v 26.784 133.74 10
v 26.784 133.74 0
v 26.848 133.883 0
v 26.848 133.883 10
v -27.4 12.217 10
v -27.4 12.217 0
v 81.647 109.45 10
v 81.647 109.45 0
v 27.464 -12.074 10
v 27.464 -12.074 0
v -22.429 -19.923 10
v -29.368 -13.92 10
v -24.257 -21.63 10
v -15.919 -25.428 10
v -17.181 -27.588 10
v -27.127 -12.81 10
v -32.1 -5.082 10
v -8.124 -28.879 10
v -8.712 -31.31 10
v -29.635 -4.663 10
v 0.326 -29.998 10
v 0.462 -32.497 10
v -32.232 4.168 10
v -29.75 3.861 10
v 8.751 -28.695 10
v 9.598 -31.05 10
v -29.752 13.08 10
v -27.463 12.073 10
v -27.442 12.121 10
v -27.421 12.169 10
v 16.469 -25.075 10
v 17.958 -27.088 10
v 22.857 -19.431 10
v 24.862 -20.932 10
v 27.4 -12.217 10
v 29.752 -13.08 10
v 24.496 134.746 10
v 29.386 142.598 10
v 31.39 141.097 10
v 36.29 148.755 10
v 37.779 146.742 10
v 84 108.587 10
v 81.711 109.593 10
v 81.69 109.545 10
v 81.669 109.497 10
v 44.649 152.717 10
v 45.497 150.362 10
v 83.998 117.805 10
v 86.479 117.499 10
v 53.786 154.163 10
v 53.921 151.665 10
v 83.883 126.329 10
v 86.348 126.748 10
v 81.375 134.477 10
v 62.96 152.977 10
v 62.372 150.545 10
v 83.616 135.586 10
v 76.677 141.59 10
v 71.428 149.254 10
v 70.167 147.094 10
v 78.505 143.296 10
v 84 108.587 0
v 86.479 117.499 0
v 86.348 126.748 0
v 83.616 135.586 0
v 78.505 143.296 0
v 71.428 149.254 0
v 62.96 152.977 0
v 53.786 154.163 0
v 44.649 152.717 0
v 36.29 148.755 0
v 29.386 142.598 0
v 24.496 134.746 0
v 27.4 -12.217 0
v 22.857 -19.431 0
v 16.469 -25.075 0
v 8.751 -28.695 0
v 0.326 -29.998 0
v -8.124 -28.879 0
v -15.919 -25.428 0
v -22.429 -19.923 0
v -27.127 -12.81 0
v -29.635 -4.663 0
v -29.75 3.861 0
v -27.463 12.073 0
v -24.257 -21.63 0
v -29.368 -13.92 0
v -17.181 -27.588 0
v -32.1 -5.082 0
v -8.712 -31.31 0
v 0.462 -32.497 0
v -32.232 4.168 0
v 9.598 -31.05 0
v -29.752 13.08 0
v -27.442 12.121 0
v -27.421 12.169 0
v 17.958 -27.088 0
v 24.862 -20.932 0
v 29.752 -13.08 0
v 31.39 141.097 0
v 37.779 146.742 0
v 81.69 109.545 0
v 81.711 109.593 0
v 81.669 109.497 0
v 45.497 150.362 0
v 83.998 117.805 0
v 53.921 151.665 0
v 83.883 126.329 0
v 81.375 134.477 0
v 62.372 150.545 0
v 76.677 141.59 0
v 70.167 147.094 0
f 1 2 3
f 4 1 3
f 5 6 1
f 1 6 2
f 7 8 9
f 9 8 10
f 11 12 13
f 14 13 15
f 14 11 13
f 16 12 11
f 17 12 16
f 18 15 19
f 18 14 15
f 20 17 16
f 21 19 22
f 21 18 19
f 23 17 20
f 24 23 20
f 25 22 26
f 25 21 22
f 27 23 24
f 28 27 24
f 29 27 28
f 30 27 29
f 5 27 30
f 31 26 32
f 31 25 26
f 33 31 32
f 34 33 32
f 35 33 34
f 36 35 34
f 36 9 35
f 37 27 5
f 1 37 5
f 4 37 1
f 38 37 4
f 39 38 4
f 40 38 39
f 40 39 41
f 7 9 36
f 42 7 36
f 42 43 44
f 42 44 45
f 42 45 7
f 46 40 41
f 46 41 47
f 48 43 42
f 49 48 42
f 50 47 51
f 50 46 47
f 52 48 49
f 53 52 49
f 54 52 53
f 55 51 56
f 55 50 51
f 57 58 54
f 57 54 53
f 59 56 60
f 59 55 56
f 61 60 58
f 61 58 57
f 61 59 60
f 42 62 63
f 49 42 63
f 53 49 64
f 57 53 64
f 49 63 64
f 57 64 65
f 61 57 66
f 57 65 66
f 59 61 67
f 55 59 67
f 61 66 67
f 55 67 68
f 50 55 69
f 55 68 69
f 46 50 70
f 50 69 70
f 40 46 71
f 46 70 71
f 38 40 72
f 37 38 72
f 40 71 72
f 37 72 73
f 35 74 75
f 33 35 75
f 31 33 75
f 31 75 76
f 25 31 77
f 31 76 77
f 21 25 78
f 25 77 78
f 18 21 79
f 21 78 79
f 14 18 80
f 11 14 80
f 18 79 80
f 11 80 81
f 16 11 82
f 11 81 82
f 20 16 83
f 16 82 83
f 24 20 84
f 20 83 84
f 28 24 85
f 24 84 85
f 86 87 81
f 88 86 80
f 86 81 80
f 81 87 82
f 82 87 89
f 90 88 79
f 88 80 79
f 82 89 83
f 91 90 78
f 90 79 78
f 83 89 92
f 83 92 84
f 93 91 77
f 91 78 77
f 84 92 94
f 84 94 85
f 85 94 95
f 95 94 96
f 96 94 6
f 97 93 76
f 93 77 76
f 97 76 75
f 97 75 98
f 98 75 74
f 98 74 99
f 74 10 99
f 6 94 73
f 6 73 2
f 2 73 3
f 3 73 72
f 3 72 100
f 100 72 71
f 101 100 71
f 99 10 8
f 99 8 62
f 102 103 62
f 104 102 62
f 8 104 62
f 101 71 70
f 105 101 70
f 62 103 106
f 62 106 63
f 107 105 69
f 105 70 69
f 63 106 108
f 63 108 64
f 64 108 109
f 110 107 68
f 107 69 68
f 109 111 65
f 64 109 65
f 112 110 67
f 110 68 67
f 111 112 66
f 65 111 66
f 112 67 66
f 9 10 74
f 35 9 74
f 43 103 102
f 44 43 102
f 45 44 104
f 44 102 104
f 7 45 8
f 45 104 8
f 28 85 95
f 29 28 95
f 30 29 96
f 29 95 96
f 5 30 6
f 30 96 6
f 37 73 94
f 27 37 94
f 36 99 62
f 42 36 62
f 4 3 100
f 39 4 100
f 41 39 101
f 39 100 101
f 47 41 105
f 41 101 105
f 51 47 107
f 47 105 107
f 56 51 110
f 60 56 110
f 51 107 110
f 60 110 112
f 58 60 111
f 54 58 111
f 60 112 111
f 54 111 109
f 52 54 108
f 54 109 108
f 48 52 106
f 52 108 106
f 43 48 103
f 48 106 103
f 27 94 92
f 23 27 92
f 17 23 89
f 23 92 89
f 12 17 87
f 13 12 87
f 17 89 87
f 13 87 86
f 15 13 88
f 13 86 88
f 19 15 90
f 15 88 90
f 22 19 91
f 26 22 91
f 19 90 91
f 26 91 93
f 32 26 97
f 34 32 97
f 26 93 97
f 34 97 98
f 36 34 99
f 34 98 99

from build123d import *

# Parameters (mm, degrees)
EXTRUDE_1_DEPTH = 10


with BuildPart() as part:
    # 草图1 → 凸台-拉伸1 (new body)
    with BuildSketch(Plane.XY):
        with BuildLine():
            Line((26.783972095, 133.739971334), (26.847812167, 133.883151585))
            ThreePointArc((26.847812167, 133.883151585), (66.392800103, 149.097978029), (81.71089656, 109.59287791))
            Line((81.71089656, 109.59287791), (83.99950279, 108.586755885))
            ThreePointArc((83.99950279, 108.586755885), (67.327208125, 151.41822318), (24.49574083, 134.745928515))
            Line((24.49574083, 134.745928515), (26.783972095, 133.739971334))
        make_face()
        with BuildLine():
            ThreePointArc((-27.46327475, 12.073464291), (-27.431635829, 12.145178293), (-27.399809643, 12.216809384))
            Line((-27.399809643, 12.216809384), (26.783972095, 133.739971334))
            Line((26.783972095, 133.739971334), (24.49574083, 134.745928515))
            Line((24.49574083, 134.745928515), (-29.75188098, 13.079586315))
            Line((-29.75188098, 13.079586315), (-27.46327475, 12.073464291))
        make_face()
        with BuildLine():
            Line((81.647431453, 109.449532816), (27.463649715, -12.073629134))
            Line((27.463649715, -12.073629134), (29.75188098, -13.079586315))
            Line((29.75188098, -13.079586315), (83.99950279, 108.586755885))
            Line((83.99950279, 108.586755885), (81.71089656, 109.59287791))
            ThreePointArc((81.71089656, 109.59287791), (81.679257639, 109.521163908), (81.647431453, 109.449532816))
        make_face()
        with BuildLine():
            Line((27.463649715, -12.073629134), (27.399809643, -12.216809384))
            ThreePointArc((27.399809643, -12.216809384), (-12.145178293, -27.431635829), (-27.46327475, 12.073464291))
            Line((-27.46327475, 12.073464291), (-29.75188098, 13.079586315))
            ThreePointArc((-29.75188098, 13.079586315), (-13.079586315, -29.75188098), (29.75188098, -13.079586315))
            Line((29.75188098, -13.079586315), (27.463649715, -12.073629134))
        make_face()
    extrude(amount=EXTRUDE_1_DEPTH)


solid = part.part
